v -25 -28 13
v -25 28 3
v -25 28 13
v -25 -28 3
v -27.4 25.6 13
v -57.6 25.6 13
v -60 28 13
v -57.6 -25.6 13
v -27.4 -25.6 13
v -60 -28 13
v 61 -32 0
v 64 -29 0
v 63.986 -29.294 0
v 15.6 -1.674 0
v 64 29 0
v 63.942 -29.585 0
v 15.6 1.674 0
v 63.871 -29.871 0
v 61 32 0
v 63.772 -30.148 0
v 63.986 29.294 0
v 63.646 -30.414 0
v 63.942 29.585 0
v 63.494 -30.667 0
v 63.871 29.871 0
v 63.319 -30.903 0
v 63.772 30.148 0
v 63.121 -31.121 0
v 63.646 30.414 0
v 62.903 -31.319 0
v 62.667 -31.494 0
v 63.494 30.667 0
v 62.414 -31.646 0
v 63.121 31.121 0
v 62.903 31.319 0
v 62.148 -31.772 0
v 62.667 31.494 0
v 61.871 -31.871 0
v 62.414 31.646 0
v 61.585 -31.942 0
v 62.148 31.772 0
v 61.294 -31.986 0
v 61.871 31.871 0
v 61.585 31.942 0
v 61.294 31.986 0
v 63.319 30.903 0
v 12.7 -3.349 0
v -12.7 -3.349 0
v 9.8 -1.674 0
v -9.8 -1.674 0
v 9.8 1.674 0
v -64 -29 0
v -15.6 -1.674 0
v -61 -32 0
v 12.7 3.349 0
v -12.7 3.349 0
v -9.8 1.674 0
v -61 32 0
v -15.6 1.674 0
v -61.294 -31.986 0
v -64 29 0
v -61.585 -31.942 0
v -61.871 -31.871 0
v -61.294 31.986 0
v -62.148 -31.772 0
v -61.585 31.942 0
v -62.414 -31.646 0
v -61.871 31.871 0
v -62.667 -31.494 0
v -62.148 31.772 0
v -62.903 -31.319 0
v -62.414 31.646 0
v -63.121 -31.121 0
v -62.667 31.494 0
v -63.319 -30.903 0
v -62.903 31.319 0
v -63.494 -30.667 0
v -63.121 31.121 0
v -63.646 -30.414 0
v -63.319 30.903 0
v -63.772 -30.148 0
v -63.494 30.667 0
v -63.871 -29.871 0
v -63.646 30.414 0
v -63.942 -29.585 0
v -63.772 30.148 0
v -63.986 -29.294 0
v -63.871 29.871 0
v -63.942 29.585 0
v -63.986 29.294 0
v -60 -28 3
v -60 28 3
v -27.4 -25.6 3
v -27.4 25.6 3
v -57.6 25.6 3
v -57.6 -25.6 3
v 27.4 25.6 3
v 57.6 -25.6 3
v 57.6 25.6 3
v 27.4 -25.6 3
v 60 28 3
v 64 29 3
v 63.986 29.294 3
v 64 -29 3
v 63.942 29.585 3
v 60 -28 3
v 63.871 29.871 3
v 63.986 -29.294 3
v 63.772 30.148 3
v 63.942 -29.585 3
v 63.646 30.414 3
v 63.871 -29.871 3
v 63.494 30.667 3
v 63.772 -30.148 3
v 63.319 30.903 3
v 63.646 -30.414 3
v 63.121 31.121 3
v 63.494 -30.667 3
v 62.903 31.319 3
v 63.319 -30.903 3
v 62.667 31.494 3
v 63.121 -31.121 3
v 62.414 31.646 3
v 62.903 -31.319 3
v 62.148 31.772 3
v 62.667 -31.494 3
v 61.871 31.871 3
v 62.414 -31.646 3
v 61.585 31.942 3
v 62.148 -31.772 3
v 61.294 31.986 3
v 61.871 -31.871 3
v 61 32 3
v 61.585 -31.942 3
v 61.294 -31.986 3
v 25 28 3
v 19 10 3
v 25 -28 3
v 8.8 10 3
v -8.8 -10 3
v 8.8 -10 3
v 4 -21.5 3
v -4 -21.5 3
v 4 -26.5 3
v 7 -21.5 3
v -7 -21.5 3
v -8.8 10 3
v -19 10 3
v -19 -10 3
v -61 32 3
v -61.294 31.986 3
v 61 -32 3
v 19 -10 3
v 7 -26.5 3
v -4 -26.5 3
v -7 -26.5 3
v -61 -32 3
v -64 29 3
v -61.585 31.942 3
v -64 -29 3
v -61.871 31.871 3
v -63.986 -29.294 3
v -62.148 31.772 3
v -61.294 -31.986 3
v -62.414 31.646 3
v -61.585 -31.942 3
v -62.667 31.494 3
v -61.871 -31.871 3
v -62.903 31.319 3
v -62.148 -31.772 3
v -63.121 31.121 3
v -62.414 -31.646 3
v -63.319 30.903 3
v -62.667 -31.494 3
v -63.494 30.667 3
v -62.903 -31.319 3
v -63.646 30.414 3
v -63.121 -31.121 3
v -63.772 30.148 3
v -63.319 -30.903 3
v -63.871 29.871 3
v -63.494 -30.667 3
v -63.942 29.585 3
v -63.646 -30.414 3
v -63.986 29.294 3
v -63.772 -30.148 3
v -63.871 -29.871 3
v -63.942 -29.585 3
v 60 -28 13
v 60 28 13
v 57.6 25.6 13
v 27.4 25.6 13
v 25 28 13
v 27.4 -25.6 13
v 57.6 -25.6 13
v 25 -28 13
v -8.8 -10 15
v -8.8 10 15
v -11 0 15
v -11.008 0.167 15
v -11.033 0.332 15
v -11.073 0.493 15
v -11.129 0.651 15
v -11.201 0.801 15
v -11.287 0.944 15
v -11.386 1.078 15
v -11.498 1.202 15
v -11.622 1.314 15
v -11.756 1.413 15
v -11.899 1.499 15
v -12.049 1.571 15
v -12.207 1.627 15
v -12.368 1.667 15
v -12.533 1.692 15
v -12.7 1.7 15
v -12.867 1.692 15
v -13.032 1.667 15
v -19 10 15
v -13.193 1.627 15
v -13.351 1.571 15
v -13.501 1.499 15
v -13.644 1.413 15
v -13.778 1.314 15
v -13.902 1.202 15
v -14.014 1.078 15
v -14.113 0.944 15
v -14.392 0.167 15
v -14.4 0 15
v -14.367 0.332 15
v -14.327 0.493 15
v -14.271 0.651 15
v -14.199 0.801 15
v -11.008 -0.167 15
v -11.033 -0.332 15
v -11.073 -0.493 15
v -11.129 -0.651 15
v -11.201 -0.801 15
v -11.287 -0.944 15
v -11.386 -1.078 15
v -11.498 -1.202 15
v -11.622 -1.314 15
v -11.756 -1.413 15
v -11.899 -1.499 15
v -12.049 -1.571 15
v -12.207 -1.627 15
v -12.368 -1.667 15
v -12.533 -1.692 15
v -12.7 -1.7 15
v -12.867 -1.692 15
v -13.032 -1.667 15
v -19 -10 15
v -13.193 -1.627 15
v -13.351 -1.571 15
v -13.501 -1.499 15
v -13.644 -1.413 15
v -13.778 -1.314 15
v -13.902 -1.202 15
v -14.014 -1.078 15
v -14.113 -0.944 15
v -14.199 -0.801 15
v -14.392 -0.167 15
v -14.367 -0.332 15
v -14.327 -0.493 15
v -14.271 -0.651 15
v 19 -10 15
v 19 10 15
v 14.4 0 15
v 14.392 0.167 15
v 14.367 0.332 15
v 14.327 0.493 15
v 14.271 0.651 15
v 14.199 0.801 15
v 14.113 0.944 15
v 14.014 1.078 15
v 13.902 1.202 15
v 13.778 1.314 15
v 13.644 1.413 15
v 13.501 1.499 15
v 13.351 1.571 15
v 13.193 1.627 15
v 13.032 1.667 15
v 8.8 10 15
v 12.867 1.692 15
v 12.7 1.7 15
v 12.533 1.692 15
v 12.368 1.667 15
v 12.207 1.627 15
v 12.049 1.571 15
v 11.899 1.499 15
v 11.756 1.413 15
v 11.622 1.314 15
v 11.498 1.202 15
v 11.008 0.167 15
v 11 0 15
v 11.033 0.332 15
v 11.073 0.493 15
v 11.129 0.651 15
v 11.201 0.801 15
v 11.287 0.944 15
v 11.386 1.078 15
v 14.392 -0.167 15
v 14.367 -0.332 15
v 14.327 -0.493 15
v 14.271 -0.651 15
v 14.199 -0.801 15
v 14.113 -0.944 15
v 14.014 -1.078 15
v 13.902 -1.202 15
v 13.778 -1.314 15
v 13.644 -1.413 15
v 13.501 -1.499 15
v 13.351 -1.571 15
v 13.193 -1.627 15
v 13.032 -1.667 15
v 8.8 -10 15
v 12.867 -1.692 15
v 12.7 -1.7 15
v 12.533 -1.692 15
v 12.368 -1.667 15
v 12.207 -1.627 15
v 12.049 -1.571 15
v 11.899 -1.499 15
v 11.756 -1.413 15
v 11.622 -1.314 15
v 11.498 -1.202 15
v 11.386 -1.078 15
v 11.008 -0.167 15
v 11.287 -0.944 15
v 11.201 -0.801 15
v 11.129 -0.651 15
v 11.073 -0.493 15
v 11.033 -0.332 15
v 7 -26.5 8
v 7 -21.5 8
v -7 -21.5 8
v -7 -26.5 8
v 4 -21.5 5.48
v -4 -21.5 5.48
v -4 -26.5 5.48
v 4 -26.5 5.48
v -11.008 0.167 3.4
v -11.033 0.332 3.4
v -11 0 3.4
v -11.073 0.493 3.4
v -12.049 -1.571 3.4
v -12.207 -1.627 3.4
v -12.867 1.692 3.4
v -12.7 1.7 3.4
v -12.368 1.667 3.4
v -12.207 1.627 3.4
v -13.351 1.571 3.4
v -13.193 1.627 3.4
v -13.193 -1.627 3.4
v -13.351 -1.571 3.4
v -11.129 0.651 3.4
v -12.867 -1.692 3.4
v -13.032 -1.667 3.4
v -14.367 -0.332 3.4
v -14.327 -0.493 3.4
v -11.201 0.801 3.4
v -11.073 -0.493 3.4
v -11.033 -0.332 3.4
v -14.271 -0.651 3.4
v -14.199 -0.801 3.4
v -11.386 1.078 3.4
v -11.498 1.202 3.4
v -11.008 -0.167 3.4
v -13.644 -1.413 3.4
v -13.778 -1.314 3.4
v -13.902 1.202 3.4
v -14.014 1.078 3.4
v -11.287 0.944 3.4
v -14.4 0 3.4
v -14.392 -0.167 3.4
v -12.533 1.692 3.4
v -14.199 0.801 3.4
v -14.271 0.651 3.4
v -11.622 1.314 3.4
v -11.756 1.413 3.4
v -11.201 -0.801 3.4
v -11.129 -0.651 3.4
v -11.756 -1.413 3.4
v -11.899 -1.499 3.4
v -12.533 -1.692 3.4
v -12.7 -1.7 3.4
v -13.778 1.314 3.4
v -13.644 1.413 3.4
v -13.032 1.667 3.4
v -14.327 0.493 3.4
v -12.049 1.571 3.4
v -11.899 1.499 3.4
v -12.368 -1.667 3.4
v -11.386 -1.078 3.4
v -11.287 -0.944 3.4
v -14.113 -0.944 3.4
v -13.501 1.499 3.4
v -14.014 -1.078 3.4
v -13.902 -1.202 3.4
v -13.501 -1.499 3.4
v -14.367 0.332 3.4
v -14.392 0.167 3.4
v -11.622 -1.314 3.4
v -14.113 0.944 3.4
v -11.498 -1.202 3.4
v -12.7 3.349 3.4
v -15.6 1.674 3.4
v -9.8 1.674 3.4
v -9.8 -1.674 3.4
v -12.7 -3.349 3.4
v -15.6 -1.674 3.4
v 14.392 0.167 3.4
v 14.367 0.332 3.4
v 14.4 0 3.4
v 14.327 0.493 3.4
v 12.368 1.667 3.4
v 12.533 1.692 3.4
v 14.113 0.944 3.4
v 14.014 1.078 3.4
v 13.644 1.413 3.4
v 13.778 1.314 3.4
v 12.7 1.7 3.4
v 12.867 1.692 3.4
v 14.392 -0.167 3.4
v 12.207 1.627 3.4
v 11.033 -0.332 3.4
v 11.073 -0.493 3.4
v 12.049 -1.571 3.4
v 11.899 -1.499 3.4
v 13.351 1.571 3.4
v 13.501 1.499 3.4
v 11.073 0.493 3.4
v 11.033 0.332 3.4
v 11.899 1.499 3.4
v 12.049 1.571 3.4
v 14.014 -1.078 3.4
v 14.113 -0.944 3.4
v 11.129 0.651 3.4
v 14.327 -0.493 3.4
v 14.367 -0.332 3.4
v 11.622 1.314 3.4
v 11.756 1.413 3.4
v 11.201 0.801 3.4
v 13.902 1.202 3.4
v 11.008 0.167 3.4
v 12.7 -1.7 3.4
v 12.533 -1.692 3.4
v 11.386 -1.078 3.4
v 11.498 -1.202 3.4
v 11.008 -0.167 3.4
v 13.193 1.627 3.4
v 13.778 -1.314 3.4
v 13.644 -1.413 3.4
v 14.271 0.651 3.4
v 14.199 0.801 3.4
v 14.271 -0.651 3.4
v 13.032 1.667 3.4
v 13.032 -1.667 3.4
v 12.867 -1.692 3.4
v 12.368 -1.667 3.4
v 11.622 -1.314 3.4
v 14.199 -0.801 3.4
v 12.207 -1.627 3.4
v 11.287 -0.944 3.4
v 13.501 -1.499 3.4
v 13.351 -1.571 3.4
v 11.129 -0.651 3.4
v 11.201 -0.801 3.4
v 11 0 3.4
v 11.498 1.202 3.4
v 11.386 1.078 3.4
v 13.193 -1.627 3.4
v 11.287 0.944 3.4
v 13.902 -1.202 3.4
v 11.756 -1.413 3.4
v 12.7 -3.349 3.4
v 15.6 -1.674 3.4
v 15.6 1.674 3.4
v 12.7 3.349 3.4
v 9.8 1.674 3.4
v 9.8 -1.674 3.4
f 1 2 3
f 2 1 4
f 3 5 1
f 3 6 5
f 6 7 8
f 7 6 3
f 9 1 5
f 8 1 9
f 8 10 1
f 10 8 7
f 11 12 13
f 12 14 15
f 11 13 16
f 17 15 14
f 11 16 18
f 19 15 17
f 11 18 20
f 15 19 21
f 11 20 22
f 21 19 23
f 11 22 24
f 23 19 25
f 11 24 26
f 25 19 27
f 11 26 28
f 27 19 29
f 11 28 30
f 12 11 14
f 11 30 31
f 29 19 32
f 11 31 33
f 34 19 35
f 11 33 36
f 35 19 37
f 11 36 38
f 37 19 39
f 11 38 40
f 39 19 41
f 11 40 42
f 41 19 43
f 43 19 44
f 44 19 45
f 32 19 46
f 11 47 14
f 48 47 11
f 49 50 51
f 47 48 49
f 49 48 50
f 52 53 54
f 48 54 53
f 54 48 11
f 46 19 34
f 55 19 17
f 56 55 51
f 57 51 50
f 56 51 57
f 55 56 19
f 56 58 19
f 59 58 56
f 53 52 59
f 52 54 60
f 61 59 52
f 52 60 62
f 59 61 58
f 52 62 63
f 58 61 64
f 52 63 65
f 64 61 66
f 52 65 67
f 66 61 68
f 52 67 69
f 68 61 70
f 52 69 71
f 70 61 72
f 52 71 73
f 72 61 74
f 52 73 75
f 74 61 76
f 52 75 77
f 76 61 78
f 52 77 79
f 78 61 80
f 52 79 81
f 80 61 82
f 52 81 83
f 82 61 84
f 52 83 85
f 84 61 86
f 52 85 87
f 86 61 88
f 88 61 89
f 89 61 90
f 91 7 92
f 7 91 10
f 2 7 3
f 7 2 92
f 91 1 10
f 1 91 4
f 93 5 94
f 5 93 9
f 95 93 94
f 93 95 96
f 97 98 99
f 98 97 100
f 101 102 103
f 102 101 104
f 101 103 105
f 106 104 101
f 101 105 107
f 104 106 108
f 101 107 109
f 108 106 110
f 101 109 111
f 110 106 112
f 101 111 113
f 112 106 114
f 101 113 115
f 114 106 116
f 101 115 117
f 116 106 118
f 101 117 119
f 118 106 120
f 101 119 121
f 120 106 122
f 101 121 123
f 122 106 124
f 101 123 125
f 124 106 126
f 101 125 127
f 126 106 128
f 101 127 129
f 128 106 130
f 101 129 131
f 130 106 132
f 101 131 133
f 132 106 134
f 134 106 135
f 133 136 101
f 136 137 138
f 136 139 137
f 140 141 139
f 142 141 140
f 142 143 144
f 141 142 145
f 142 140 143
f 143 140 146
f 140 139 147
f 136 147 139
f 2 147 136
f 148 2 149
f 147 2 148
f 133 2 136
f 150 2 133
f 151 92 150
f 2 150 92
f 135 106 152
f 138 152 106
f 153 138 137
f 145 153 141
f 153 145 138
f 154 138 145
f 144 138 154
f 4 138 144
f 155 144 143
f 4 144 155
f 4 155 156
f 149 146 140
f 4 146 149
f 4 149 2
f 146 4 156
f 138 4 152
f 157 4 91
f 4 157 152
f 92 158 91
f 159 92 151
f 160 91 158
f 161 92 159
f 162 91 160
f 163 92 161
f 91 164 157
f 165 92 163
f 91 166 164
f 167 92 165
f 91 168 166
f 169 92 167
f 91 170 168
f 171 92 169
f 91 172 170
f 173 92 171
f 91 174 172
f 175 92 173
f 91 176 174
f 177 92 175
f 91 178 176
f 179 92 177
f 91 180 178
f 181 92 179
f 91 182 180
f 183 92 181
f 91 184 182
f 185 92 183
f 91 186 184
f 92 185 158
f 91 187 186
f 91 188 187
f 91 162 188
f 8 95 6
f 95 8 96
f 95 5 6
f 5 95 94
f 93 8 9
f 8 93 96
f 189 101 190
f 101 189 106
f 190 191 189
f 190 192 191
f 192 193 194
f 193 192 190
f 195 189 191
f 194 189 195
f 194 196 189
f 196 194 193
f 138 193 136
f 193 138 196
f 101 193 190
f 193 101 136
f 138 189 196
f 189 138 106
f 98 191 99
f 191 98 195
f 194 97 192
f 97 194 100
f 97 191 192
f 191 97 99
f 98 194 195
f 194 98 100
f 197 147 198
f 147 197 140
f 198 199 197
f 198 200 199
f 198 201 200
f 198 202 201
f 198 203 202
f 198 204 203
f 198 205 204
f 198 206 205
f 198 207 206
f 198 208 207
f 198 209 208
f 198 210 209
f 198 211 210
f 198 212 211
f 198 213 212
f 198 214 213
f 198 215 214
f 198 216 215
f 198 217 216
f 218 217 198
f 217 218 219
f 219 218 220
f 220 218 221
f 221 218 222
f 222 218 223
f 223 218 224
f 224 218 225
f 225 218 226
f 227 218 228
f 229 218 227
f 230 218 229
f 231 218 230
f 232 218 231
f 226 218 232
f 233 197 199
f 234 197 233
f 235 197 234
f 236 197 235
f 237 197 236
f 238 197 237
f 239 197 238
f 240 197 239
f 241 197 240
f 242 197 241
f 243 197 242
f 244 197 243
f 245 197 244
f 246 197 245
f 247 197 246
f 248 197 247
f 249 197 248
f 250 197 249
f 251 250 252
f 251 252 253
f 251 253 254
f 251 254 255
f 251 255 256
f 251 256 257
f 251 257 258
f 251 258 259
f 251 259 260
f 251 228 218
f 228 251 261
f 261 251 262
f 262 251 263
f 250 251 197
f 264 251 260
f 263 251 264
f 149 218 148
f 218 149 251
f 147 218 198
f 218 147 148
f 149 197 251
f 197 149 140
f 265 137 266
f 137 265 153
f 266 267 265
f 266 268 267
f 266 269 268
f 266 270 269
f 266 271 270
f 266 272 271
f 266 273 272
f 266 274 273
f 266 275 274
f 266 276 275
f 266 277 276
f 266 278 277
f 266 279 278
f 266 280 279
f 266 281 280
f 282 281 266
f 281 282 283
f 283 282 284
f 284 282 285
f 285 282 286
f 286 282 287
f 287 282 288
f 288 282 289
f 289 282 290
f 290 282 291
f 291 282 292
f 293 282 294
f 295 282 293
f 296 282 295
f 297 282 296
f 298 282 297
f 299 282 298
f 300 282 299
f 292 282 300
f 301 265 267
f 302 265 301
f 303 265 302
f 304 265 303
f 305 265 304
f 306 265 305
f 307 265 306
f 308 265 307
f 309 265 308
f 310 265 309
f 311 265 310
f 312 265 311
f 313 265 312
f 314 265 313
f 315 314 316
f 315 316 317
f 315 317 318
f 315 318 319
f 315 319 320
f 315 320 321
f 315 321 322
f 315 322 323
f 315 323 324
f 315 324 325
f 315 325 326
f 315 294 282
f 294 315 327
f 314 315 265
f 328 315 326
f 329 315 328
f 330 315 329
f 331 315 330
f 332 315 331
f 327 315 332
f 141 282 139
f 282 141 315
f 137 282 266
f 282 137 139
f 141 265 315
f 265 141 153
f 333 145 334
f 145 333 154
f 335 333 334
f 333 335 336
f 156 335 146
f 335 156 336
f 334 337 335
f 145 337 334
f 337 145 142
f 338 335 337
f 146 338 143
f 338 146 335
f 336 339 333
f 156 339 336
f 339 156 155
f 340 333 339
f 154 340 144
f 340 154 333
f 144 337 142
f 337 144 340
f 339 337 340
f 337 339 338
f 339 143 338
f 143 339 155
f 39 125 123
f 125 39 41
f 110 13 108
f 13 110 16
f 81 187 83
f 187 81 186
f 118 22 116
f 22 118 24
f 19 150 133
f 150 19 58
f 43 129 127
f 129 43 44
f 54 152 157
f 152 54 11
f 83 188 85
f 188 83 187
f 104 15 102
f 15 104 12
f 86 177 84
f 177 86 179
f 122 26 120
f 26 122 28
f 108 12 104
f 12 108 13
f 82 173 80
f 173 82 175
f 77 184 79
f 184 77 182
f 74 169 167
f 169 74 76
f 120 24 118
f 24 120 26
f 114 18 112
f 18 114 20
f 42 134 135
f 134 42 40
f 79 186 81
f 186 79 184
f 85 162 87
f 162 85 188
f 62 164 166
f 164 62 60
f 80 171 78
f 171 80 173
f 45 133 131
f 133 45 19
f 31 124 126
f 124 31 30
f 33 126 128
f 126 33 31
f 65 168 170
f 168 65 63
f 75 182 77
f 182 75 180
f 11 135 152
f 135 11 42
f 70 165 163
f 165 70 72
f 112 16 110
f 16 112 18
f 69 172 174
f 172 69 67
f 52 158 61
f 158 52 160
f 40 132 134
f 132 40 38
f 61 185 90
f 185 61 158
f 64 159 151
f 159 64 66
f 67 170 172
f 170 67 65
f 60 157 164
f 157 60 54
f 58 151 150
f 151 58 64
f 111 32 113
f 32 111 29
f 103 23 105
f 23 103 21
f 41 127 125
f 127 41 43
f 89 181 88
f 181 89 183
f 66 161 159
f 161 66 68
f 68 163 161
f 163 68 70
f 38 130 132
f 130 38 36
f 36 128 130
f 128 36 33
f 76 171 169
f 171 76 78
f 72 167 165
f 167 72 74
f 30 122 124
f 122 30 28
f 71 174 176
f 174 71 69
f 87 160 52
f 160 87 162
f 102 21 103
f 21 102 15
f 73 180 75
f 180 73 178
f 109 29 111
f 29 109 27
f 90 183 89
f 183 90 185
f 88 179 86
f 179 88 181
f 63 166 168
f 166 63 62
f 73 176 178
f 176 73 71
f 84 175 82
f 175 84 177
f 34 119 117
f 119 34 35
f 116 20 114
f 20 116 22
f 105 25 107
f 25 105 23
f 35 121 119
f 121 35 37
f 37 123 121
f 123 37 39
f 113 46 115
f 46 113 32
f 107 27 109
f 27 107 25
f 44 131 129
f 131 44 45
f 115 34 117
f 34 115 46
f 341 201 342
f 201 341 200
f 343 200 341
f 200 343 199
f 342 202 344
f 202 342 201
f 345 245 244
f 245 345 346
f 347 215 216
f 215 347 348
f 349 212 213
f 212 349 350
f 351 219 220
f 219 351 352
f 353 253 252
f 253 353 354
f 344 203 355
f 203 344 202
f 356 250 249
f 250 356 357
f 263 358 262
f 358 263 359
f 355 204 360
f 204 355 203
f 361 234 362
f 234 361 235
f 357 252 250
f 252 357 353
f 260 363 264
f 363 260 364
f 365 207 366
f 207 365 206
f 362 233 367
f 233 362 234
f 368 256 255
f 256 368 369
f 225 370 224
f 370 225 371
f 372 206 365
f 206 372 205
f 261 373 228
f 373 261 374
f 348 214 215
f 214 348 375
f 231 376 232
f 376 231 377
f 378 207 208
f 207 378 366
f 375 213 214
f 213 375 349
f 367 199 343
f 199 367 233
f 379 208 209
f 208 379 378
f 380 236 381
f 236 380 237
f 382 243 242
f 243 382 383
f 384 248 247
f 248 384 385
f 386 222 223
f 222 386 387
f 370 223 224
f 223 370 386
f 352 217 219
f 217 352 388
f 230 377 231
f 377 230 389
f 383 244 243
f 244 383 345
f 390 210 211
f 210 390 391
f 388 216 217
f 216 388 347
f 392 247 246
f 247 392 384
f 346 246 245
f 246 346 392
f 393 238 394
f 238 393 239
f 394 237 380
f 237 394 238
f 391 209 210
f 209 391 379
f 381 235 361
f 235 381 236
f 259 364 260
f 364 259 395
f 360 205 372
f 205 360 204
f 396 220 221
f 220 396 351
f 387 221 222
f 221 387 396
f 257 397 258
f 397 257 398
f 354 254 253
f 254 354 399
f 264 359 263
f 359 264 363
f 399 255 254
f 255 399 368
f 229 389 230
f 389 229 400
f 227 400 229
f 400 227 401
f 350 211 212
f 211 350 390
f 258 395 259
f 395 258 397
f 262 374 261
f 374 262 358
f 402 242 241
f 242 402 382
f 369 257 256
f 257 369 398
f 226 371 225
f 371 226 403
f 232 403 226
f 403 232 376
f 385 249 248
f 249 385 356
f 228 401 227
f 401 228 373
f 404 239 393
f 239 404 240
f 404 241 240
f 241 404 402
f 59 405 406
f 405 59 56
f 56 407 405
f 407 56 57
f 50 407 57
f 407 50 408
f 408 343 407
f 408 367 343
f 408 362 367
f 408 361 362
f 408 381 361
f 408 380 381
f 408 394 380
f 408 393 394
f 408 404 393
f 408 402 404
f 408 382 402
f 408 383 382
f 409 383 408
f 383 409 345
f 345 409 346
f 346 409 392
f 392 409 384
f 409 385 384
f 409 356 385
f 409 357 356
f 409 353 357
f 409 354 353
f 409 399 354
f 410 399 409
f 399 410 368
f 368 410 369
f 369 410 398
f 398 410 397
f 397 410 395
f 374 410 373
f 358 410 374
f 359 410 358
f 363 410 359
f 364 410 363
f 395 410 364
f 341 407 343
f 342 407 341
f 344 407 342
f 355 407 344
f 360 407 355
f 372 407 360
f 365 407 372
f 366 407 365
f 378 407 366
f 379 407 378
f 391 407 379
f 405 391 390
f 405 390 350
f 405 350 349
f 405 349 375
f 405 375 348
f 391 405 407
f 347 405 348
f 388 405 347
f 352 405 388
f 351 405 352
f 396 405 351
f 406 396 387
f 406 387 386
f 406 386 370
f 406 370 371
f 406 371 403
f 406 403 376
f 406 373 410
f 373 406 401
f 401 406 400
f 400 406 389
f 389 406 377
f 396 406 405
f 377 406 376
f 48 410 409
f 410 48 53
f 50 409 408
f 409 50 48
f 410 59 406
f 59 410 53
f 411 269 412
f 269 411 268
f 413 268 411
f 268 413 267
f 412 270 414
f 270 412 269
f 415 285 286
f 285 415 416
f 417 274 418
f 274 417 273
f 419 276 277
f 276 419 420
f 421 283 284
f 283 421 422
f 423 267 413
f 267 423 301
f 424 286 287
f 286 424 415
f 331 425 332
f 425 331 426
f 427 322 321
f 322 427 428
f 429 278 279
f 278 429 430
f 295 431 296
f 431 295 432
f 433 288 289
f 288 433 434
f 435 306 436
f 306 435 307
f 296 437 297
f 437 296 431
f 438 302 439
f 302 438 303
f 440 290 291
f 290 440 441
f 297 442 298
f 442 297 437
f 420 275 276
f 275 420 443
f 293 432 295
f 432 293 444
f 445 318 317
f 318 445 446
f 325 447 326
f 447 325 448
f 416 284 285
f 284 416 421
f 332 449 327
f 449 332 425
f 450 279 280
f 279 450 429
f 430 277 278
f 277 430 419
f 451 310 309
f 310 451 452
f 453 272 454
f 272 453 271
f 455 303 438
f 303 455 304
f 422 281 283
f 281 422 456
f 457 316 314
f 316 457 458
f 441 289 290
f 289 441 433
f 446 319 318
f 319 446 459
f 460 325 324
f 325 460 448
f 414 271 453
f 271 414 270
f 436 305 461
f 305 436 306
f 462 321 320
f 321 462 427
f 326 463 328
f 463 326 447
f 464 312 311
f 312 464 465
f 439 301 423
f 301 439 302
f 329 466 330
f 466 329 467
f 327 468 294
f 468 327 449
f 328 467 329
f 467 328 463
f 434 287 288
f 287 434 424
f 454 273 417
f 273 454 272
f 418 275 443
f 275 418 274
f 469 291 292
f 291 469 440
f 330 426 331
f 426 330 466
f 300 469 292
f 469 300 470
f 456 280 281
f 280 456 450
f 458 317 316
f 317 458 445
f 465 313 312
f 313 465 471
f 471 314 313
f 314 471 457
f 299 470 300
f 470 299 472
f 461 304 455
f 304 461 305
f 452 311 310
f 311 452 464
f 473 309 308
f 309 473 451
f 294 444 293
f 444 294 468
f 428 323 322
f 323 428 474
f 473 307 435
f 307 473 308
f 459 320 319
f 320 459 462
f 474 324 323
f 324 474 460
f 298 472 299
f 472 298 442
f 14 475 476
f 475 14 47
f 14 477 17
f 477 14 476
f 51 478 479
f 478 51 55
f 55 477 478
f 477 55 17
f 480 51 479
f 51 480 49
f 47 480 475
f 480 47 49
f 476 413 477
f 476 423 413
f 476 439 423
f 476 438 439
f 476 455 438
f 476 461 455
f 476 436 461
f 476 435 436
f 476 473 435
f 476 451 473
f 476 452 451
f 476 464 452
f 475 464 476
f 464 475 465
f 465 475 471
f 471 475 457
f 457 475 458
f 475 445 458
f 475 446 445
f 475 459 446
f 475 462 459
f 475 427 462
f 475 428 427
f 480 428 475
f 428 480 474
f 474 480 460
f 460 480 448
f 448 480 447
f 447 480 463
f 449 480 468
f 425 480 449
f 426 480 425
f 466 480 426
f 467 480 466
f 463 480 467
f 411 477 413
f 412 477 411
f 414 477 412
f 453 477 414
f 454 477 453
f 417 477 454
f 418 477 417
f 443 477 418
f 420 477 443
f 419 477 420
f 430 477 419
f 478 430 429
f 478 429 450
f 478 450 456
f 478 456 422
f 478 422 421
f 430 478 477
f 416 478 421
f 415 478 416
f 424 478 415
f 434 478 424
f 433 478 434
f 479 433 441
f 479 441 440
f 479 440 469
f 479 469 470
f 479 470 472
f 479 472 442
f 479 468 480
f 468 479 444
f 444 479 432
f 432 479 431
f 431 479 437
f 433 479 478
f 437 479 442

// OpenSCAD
// OPB912W55Z weighted mount. Millimetres. Print flat, as exported.
// Drawing: TT Electronics OPB900-913, Issue A 09/2016, p2 W series.
// Public reference and mechanical inputs: README.md.
// X = emitter-to-receiver; Y = pendulum travel; Z = up.
sensor_count = 1; // [1,2]
sensor_pitch = 18; // centre-to-centre along travel; not a calibrated baseline
show_sensors = true; // preview only: never included in STL
part = "mount"; // [mount,coupon]

base_width = 128;
base_length = max(64, (sensor_count-1)*sensor_pitch + 46);
floor_thickness = 3;
seat_z = 15; // underside of sensor mounting flange
rail_inner = 8.8; // clears 16.38 +/-0.13 underside moulding
rail_outer = 19;
rail_length = (sensor_count-1)*sensor_pitch + 20;
hole_pitch = 25.4;
screw_clearance = 3.4;
nut_af = 5.8;
nut_depth = 3.4; // bottom-open M3 nut recess; bridge above this pocket
tray_width = 35;
tray_wall = 2.4;
tray_depth = 10;
tray_length = base_length-8;
tray_x = base_width/2 - 4 - tray_width/2;
$fn = 64;
eps = 0.02;

assert(sensor_count == 1 || sensor_count == 2, "Use one or two sensors");
assert(sensor_pitch >= 10, "Sensor bodies need separation");
assert(rail_inner > (16.38+0.13)/2, "Underside housing clearance");
assert(tray_x-tray_width/2 > rail_outer+3, "Tray/rail clearance");

module block(w,l,h,z=0) { translate([-w/2,-l/2,z]) cube([w,l,h]); }
module rounded_plate(w,l,h,r=3) {
    hull() for(x=[-w/2+r,w/2-r], y=[-l/2+r,l/2-r])
        translate([x,y,0]) cylinder(r=r,h=h);
}
module fastener(x,y) {
    translate([x,y,-eps]) cylinder(d=screw_clearance,h=seat_z+2*eps);
    translate([x,y,-eps]) rotate([0,0,30])
        cylinder(d=nut_af/cos(30),h=nut_depth+eps,$fn=6);
}
module tray(x) {
    translate([x,0,0]) difference() {
        block(tray_width,tray_length,floor_thickness+tray_depth);
        block(tray_width-2*tray_wall,tray_length-2*tray_wall,
              tray_depth+eps,floor_thickness);
    }
}
module mount() {
    difference() {
        union() {
            rounded_plate(base_width,base_length,floor_thickness);
            for(s=[-1,1]) {
                translate([s*(rail_inner+rail_outer)/2,0,0])
                    block(rail_outer-rail_inner,rail_length,seat_z);
                tray(s*tray_x);
            }
            // Raised cable-tie bridge at the front. Short 8 mm bridge only.
            translate([0,-base_length/2+8,floor_thickness])
                difference() {
                    block(14,5,5);
                    block(8,5+eps*2,2.5,-eps);
                }
        }
        for(i=[0:sensor_count-1], s=[-1,1])
            fastener(s*hole_pitch/2,(i-(sensor_count-1)/2)*sensor_pitch);
    }
}
// Small initial print checks screw, nut, flange pitch and wire clearance.
module coupon() {
    difference() {
        union() {
            block(40,16,floor_thickness);
            for(s=[-1,1]) translate([s*(rail_inner+rail_outer)/2,0,0])
                block(rail_outer-rail_inner,16,seat_z);
        }
        for(s=[-1,1]) fastener(s*hole_pitch/2,0);
    }
}
// Simplified reference envelope, NOT a manufacturer CAD model.
module sensor_reference(y) {
    translate([0,y,seat_z]) color([0.12,0.13,0.15]) {
        difference() {
            hull() for(s=[-1,1]) translate([s*12.7,0,0])
                cylinder(d=6.35,h=2.03);
            for(s=[-1,1]) translate([s*12.7,0,-eps])
                cylinder(d=3.18,h=2.1);
        }
        for(s=[-1,1]) translate([s*(9.53/2+(18.67-9.53)/4),0,2.03])
            block((18.67-9.53)/2,6.35,10.8-2.03);
        block(16.38,4.83,4.83,-4.83);
    }
    for(s=[-1,1]) color("orange")
        translate([s*6.5,y,seat_z-9]) cylinder(d=1.6,h=5);
}

if(part == "coupon") coupon();
else {
    color([0.24,0.42,0.48]) mount();
    if($preview && show_sensors)
        for(i=[0:sensor_count-1])
            sensor_reference((i-(sensor_count-1)/2)*sensor_pitch);
}
